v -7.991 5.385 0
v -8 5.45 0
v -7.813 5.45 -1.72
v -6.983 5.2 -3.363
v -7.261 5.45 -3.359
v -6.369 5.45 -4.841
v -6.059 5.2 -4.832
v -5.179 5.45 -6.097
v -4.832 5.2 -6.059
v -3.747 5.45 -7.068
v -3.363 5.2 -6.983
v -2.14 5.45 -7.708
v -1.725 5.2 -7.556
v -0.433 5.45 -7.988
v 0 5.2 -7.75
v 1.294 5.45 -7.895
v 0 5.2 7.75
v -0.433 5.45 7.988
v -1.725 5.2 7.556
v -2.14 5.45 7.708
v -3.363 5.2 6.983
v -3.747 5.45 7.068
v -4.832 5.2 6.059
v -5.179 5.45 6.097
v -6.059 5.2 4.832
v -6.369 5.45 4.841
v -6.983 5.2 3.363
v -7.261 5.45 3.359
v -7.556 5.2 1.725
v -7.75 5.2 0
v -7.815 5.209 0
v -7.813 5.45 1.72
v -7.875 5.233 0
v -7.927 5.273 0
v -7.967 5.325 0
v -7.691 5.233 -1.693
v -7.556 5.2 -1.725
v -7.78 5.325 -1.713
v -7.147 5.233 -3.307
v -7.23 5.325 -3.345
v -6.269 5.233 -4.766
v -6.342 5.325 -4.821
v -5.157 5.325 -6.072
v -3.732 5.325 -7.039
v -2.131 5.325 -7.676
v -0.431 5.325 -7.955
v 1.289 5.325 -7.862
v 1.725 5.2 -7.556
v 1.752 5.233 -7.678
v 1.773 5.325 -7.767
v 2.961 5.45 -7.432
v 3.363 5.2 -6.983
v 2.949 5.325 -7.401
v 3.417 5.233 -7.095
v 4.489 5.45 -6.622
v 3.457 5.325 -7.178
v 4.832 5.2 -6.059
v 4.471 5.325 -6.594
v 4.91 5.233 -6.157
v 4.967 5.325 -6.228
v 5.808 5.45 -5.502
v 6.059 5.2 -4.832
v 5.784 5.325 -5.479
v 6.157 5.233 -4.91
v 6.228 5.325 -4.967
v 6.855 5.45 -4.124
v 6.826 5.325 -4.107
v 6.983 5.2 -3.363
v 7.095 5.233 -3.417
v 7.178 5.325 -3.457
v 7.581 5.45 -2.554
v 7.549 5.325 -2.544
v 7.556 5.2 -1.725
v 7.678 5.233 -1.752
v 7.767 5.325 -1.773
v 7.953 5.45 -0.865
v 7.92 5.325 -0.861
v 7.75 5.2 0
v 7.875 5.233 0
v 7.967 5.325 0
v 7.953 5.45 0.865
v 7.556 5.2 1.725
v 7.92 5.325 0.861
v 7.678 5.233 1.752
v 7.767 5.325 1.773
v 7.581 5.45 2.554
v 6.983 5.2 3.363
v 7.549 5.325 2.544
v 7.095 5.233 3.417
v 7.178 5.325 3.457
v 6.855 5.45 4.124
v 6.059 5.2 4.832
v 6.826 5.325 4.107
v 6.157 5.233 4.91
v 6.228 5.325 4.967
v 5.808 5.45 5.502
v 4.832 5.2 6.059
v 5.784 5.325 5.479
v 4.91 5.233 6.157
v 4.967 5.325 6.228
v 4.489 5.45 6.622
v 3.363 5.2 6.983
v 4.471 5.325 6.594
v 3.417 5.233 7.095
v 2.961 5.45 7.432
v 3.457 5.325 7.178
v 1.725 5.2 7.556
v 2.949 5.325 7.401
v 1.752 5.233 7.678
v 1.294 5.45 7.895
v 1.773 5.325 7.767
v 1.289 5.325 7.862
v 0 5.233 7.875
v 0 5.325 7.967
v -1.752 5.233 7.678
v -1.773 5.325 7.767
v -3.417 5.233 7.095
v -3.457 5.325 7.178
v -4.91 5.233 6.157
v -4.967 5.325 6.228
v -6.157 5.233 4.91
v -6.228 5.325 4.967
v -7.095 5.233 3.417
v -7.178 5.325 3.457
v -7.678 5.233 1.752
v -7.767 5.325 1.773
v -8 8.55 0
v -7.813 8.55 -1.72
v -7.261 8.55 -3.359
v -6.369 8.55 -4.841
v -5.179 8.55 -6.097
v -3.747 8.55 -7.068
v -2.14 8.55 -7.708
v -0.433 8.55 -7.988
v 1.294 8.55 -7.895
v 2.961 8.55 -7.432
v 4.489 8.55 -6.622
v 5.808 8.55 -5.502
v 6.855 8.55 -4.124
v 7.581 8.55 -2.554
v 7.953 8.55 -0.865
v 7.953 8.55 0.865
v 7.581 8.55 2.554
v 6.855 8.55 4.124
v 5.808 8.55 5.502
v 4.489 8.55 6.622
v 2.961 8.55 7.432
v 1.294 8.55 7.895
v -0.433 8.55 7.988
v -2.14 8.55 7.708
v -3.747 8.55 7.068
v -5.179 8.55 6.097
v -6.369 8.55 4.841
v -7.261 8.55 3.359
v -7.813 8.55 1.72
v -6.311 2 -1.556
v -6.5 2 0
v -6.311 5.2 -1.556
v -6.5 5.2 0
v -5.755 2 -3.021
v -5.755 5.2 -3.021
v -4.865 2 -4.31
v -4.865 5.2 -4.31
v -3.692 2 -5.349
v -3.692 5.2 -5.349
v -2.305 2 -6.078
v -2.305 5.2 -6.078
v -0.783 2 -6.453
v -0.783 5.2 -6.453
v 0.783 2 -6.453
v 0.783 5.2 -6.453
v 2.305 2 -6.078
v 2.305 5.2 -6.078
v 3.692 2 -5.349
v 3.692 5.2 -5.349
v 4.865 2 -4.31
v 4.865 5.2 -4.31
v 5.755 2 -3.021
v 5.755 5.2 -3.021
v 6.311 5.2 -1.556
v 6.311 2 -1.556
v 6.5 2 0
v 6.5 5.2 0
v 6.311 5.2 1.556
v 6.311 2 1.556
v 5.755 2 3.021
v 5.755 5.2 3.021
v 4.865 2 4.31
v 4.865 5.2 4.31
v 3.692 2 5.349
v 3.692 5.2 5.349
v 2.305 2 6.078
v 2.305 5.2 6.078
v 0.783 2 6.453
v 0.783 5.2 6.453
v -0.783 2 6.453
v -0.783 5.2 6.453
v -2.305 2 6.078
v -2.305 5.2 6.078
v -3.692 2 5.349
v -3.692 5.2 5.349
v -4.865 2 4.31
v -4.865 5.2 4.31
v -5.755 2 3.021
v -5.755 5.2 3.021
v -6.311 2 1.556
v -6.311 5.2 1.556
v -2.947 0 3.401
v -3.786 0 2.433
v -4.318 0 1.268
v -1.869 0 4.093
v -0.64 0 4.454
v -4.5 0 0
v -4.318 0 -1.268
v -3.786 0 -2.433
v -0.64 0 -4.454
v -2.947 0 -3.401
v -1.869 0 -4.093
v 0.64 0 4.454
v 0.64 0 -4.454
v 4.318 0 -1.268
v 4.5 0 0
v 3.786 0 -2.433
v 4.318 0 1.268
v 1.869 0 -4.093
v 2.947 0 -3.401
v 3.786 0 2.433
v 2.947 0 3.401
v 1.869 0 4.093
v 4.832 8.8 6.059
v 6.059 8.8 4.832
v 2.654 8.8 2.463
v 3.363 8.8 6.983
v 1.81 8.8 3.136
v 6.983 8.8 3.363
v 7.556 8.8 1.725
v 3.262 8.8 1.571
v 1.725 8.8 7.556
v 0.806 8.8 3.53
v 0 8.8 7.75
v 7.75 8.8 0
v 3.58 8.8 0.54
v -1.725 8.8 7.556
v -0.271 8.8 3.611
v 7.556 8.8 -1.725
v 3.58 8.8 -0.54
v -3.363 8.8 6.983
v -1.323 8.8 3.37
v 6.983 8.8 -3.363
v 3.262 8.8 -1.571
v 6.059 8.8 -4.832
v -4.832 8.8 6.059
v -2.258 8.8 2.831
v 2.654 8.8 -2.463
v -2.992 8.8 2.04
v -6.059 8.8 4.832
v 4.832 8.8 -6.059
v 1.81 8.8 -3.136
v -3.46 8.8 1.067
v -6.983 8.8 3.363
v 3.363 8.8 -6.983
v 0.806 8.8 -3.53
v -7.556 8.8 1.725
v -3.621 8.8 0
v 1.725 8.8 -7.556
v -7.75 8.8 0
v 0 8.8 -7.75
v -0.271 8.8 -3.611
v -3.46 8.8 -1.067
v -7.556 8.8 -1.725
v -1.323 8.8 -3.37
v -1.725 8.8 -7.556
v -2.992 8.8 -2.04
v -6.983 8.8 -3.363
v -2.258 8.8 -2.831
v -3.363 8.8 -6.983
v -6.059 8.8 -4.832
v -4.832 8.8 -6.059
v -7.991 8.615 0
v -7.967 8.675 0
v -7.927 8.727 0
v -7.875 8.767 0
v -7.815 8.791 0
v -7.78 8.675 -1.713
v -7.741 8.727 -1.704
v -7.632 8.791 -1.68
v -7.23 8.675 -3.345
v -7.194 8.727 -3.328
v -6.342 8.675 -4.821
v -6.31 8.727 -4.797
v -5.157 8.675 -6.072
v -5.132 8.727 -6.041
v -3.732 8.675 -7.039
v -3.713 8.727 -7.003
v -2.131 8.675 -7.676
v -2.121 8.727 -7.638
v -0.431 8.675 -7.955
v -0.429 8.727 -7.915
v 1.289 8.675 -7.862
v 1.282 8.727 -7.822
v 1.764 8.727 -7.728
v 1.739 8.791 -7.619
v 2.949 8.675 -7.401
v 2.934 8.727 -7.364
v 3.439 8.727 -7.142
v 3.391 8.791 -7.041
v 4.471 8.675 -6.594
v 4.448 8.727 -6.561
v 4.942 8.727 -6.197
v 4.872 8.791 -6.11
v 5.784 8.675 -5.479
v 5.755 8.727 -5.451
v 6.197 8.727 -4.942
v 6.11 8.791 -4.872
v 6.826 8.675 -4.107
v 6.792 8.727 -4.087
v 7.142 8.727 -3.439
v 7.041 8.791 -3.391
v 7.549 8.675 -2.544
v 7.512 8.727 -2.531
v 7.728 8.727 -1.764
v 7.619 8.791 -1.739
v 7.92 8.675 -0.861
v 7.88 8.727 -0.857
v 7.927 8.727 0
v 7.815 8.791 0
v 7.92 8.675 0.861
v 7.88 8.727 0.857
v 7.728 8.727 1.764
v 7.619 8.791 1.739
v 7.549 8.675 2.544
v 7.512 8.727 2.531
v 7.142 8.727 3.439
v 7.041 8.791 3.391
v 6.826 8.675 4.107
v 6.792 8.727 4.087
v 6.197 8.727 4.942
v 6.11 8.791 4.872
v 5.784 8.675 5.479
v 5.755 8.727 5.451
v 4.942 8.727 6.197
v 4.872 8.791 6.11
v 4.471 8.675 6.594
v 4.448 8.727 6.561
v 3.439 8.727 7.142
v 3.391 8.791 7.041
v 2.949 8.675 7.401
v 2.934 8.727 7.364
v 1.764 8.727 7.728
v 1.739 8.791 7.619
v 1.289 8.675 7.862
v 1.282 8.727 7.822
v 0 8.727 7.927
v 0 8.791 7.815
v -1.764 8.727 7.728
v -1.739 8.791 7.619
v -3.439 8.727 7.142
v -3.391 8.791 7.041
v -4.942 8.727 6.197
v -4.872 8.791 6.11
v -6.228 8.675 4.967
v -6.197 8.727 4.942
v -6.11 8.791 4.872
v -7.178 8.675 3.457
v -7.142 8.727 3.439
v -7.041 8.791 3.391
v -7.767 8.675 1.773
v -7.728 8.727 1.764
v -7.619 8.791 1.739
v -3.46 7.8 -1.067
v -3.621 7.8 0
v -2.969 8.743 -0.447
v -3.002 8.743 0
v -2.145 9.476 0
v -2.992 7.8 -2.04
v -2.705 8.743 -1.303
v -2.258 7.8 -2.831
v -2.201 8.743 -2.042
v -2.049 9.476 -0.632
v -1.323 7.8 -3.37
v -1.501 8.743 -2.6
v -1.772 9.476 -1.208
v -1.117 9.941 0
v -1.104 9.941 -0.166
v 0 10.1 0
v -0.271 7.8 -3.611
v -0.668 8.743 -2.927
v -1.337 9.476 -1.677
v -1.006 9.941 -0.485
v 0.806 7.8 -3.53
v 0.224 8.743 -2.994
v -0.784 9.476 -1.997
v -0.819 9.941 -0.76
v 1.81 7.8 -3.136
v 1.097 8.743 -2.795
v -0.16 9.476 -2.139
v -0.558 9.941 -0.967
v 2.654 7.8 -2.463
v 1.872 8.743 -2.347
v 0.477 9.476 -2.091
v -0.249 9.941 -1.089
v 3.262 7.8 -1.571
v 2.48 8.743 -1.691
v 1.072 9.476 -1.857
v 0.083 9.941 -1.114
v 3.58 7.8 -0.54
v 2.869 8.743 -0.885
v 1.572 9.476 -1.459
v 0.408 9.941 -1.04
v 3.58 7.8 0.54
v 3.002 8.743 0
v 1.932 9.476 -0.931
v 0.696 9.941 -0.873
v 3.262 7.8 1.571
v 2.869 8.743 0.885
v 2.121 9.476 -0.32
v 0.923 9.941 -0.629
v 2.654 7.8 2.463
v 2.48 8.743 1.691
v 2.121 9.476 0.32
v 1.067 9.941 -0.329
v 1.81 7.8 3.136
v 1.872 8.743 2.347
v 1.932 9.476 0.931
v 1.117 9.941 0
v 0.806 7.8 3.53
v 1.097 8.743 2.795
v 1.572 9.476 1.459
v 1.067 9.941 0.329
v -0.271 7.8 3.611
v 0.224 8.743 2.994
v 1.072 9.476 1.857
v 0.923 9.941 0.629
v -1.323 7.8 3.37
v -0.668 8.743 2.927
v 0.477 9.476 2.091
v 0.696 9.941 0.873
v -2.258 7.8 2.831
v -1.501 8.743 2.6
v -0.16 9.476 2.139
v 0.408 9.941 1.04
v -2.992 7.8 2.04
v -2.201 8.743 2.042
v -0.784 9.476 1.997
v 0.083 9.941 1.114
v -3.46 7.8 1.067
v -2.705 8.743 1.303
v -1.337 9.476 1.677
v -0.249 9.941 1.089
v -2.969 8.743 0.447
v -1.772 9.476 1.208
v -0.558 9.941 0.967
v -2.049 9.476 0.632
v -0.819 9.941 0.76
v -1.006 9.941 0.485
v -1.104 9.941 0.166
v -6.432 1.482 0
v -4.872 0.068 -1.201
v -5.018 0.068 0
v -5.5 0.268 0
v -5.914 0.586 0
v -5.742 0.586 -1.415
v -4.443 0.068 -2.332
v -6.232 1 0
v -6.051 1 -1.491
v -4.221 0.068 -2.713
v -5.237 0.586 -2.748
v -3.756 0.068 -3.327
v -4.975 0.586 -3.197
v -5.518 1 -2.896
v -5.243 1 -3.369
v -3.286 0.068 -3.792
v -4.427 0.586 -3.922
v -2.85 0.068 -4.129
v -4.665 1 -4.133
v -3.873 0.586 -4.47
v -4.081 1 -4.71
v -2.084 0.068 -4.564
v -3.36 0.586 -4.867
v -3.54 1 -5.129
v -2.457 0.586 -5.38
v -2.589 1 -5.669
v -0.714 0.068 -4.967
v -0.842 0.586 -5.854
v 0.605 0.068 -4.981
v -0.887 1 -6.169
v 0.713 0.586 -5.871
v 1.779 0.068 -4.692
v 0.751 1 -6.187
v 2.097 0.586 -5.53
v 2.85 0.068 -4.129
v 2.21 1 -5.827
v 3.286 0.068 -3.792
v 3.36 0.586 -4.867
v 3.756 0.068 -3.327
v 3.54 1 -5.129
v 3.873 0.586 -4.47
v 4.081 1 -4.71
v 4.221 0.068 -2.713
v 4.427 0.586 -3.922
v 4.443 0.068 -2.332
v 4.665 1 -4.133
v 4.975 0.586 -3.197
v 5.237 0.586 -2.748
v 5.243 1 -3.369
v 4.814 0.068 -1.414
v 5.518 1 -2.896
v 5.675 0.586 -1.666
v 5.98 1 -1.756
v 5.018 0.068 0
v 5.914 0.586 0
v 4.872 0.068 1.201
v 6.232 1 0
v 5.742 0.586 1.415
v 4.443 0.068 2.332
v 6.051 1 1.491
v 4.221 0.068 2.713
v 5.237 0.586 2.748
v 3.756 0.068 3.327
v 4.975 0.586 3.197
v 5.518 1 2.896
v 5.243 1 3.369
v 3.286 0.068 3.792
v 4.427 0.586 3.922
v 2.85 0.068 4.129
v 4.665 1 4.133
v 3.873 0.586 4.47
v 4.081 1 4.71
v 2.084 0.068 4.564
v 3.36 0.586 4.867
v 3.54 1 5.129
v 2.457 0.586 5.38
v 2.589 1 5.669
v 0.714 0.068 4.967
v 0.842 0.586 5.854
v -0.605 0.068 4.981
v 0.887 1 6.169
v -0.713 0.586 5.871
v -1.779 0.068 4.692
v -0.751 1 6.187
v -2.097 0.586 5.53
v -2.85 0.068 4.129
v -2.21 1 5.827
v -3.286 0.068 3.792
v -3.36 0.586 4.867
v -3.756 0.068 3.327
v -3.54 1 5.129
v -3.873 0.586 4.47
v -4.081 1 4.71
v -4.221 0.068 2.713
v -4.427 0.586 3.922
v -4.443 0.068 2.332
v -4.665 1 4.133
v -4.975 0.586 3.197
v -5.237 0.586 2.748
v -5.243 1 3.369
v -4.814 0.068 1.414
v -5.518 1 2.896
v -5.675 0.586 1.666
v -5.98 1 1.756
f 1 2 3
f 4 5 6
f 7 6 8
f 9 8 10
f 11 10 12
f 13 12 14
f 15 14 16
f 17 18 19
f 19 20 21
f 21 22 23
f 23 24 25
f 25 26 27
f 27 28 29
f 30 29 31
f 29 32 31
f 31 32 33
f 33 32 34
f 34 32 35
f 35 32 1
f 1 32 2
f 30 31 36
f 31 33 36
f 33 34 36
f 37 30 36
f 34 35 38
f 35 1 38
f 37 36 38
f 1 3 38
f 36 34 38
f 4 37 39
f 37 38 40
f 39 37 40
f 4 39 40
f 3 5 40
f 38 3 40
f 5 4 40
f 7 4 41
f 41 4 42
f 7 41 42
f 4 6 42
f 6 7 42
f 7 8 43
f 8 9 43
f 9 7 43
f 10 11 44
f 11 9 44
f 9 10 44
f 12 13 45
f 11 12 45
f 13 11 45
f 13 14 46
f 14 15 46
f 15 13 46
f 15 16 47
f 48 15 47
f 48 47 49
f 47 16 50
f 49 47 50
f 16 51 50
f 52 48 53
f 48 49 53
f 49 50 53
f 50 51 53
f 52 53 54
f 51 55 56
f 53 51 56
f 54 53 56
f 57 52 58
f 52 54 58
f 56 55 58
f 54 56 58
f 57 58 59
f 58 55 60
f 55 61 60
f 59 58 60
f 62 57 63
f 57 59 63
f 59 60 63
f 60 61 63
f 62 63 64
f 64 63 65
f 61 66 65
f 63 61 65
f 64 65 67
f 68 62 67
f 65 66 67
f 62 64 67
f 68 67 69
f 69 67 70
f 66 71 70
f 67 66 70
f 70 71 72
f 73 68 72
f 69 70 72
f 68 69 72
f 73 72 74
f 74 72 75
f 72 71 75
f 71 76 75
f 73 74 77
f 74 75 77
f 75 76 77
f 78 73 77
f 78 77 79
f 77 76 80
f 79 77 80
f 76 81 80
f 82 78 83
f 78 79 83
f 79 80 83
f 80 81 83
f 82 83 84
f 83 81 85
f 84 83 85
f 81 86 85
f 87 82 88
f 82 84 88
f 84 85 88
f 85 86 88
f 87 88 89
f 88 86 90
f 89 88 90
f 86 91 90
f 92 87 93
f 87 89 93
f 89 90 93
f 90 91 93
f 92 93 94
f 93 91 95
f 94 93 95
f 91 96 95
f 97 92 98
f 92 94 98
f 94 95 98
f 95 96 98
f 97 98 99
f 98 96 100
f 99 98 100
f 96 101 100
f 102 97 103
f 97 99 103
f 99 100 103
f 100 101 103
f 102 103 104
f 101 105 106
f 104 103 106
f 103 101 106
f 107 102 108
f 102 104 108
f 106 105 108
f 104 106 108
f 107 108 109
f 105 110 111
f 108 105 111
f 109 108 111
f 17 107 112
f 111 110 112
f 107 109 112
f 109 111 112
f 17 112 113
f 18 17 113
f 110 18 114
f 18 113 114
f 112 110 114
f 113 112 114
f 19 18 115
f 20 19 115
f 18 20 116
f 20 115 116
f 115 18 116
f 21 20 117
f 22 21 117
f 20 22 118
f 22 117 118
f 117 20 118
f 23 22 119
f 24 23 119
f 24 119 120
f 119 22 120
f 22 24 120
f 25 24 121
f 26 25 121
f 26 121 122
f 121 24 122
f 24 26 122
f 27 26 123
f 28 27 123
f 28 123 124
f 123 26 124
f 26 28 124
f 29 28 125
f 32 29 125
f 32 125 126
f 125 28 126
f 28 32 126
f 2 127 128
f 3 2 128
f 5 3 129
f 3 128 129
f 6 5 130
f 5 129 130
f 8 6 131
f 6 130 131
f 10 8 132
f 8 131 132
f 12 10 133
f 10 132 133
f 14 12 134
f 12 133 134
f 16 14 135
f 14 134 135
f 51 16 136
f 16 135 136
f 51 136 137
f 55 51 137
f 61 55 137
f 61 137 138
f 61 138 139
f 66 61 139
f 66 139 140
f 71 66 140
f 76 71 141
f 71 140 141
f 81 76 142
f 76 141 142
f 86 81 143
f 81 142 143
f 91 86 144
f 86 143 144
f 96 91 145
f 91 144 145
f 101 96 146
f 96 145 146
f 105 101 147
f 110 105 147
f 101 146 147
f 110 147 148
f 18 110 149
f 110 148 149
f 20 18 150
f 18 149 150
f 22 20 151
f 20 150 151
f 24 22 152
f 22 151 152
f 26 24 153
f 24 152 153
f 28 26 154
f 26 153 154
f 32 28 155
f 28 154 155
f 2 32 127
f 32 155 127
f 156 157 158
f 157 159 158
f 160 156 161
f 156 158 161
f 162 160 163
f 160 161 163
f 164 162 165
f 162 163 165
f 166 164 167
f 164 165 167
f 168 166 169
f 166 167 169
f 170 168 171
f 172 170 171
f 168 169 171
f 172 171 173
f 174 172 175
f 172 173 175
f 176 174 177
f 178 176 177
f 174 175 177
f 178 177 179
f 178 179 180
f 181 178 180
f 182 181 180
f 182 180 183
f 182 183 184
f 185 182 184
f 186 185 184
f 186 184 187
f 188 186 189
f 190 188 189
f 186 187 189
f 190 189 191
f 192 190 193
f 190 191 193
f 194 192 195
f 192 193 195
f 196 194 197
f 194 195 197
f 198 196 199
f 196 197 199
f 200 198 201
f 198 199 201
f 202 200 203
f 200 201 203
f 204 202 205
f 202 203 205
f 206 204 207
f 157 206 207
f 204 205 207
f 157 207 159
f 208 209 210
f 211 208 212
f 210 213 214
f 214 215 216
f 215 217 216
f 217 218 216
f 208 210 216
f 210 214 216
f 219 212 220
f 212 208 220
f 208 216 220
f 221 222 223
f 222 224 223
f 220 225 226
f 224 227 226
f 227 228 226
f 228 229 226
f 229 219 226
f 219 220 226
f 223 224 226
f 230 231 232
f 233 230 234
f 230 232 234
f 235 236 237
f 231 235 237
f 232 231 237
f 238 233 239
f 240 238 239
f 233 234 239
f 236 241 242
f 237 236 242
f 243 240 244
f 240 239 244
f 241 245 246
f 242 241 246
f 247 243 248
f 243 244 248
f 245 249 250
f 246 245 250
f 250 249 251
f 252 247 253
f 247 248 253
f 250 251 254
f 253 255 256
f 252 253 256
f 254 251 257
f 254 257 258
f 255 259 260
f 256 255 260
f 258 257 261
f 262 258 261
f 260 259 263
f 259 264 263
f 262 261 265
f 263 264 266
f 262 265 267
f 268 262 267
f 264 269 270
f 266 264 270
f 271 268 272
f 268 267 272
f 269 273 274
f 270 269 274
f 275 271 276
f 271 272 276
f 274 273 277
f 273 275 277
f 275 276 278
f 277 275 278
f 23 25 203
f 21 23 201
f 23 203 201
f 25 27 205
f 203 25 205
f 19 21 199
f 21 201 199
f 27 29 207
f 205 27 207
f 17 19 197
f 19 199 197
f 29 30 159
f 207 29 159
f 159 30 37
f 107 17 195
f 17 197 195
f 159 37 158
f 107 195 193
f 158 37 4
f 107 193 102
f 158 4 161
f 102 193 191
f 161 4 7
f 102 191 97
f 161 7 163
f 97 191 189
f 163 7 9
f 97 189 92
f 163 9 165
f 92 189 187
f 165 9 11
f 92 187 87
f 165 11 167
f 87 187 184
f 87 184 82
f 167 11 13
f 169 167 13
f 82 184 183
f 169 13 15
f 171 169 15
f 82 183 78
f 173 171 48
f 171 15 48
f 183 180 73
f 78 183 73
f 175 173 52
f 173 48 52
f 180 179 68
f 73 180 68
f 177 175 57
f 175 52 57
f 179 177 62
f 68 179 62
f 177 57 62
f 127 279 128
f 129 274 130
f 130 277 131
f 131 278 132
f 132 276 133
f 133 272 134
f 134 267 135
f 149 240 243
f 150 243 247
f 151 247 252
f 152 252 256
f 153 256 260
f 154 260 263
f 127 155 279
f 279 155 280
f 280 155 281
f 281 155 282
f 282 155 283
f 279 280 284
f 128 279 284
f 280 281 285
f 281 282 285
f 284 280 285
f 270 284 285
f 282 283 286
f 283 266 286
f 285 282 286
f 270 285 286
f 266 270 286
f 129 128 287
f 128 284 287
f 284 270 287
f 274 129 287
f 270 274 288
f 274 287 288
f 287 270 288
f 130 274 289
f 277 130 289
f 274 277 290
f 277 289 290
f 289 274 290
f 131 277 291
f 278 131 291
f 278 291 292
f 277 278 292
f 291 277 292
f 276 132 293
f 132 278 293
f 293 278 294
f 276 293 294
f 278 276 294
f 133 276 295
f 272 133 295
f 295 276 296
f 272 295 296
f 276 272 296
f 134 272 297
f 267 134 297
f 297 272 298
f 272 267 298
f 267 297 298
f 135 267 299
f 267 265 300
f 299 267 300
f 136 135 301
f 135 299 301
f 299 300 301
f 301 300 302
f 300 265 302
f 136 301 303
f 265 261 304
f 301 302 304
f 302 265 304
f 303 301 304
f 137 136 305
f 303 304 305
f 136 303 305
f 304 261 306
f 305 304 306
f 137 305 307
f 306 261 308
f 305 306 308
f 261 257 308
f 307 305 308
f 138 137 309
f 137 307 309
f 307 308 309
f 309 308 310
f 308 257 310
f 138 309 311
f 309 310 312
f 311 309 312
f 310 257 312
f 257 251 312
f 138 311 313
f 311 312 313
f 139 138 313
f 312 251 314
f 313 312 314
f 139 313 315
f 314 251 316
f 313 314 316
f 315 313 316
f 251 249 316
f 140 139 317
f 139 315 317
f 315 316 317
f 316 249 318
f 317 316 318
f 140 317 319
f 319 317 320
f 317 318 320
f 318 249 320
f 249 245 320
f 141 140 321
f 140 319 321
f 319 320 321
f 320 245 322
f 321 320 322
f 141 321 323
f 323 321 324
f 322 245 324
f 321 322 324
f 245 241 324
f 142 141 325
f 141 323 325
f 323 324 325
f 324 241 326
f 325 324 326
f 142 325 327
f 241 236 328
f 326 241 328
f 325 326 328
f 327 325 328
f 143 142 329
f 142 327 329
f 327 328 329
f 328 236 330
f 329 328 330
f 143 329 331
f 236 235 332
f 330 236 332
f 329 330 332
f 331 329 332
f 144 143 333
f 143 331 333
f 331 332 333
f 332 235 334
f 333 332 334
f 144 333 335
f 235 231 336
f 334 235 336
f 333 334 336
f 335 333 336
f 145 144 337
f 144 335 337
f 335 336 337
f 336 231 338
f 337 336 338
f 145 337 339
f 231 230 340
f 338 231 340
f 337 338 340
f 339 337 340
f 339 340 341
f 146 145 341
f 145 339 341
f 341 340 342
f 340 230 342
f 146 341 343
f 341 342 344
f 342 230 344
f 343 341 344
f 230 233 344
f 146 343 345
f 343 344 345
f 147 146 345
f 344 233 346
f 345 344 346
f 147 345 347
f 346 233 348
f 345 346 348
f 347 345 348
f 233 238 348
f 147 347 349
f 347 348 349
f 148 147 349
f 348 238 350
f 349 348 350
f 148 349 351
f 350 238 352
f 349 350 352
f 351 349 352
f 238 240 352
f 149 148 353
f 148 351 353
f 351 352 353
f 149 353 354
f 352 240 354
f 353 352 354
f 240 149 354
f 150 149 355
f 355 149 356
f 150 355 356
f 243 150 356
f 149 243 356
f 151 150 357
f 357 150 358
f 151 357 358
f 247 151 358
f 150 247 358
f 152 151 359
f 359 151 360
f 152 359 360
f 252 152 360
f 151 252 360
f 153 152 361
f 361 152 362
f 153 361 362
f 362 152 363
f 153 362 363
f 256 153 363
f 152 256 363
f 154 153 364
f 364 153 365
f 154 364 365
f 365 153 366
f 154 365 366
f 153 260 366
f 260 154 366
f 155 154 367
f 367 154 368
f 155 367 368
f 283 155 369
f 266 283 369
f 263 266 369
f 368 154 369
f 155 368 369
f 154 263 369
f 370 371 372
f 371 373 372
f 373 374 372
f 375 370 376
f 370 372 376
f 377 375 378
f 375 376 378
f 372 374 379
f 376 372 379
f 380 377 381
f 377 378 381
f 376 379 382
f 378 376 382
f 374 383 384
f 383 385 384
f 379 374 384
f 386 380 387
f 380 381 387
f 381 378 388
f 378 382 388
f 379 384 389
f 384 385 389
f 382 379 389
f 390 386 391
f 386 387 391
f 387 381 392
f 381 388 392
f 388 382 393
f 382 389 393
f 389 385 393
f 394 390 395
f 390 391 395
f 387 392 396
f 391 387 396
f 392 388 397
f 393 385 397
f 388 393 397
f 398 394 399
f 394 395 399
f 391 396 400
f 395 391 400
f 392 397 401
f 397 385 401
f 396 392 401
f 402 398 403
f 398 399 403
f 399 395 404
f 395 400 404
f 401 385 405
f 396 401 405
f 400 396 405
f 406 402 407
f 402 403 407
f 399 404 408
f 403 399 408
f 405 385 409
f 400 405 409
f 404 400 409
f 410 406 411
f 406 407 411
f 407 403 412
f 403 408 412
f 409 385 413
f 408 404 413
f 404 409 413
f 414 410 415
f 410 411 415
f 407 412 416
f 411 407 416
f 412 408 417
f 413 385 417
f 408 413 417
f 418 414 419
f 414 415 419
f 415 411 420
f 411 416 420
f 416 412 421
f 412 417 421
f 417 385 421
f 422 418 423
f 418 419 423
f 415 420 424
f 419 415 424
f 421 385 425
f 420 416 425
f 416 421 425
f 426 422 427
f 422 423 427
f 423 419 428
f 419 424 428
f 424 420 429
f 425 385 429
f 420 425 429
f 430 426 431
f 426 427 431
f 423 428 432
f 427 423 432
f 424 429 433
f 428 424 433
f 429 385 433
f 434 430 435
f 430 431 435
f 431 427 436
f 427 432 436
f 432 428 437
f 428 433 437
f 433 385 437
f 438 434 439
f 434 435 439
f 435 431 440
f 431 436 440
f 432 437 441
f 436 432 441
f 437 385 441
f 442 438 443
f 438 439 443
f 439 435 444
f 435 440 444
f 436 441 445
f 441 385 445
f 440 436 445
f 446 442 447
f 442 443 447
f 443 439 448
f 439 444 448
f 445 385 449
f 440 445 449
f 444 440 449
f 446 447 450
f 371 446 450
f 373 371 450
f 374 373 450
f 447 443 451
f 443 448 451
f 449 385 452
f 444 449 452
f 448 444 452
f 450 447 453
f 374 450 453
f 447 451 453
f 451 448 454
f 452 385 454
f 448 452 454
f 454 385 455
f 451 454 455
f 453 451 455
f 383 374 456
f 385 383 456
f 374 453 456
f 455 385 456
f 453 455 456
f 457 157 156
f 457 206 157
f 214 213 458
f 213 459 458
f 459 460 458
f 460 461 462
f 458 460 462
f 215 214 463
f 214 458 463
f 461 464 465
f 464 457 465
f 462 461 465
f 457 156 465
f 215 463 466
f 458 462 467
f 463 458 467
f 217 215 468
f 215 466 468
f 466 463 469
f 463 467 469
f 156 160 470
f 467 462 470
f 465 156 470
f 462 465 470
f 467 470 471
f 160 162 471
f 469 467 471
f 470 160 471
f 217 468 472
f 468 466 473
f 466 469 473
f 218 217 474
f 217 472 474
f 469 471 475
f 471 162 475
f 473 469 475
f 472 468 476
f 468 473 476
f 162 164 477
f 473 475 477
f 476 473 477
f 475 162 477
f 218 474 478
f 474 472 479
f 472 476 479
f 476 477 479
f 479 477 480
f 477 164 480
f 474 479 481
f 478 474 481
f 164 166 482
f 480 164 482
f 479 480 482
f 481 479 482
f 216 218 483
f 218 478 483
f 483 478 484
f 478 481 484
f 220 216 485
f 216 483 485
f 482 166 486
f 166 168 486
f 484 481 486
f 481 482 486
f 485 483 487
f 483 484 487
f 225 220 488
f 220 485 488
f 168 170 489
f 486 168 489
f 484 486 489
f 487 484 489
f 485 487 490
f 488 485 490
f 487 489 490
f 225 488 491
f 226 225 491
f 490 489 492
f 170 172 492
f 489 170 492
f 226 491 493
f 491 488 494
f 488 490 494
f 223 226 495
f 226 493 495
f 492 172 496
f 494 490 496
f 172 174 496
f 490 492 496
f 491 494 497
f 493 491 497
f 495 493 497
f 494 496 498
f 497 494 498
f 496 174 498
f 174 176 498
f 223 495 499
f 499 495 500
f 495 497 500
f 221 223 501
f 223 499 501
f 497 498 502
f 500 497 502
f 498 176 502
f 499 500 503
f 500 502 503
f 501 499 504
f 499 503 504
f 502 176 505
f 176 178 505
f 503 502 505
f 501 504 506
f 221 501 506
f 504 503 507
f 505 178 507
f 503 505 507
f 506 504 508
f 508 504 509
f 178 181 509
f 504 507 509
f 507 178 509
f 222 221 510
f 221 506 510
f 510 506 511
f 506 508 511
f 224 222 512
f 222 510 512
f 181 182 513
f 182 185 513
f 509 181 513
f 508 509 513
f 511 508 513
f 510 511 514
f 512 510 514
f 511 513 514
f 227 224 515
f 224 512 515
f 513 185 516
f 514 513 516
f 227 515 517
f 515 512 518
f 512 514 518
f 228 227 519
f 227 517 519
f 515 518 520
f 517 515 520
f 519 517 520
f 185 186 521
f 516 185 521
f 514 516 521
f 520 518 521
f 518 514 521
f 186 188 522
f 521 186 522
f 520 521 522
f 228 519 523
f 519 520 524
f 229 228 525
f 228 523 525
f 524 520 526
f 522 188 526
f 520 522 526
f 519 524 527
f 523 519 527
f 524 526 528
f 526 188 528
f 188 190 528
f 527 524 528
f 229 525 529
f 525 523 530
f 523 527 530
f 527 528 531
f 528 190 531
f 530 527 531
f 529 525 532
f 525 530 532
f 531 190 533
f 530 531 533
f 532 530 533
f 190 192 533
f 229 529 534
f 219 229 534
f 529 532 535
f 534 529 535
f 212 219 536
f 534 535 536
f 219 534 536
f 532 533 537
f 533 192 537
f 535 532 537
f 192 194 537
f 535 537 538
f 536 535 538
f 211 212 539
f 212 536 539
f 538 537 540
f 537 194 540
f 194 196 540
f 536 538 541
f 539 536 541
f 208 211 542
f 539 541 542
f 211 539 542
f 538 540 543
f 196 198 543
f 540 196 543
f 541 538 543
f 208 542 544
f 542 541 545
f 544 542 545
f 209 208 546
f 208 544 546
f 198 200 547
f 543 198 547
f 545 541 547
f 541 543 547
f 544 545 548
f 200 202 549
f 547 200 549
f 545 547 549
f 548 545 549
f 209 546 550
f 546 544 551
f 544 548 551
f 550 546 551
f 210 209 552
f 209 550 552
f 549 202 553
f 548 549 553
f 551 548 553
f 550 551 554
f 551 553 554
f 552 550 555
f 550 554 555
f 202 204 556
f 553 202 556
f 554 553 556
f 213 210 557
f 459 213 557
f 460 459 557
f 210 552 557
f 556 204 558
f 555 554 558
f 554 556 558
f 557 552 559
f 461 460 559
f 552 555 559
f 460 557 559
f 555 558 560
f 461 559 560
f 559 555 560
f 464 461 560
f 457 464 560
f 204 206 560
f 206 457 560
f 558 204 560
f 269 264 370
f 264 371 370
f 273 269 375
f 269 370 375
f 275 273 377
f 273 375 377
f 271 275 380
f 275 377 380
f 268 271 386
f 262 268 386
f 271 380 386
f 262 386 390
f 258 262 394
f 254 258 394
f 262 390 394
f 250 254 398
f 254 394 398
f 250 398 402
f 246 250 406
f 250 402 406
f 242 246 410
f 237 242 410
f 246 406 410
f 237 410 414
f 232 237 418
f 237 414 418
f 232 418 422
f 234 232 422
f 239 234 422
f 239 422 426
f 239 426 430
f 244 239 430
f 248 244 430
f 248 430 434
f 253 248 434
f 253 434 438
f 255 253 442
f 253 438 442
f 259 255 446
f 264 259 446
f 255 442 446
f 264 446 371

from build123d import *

# Parameters (mm, degrees)
CONG_1_R = 0.25


with BuildPart() as part:
    # Esquisse1 → Révolution1 (revolve)
    with BuildSketch(Plane.XY):
        with BuildLine():
            Line((0, 0), (-4.5, 0))
            ThreePointArc((-4.5, 0), (-5.914213562, 0.585786438), (-6.5, 2))
            Line((-6.5, 2), (-6.5, 5.2))
            Line((-6.5, 5.2), (-8, 5.2))
            Line((-8, 5.2), (-8, 8.8))
            Line((-8, 8.8), (-3.620773398, 8.8))
            Line((-3.620773398, 8.8), (-3.620773398, 7.8))
            ThreePointArc((-3.620773398, 7.8), (-2.144761059, 9.476388603), (0, 10.1))
            Line((0, 10.1), (0, 0))
        make_face()
    revolve(axis=Axis((0, 10.1, 0), (0, -1, 0)))

    # Congé1
    cong_1_edges = [part.edges().sort_by_distance(p)[0] for p in [
        (8, 8.8, 0),
        (8, 5.2, 0),
    ]]
    fillet(cong_1_edges, radius=CONG_1_R)


solid = part.part
